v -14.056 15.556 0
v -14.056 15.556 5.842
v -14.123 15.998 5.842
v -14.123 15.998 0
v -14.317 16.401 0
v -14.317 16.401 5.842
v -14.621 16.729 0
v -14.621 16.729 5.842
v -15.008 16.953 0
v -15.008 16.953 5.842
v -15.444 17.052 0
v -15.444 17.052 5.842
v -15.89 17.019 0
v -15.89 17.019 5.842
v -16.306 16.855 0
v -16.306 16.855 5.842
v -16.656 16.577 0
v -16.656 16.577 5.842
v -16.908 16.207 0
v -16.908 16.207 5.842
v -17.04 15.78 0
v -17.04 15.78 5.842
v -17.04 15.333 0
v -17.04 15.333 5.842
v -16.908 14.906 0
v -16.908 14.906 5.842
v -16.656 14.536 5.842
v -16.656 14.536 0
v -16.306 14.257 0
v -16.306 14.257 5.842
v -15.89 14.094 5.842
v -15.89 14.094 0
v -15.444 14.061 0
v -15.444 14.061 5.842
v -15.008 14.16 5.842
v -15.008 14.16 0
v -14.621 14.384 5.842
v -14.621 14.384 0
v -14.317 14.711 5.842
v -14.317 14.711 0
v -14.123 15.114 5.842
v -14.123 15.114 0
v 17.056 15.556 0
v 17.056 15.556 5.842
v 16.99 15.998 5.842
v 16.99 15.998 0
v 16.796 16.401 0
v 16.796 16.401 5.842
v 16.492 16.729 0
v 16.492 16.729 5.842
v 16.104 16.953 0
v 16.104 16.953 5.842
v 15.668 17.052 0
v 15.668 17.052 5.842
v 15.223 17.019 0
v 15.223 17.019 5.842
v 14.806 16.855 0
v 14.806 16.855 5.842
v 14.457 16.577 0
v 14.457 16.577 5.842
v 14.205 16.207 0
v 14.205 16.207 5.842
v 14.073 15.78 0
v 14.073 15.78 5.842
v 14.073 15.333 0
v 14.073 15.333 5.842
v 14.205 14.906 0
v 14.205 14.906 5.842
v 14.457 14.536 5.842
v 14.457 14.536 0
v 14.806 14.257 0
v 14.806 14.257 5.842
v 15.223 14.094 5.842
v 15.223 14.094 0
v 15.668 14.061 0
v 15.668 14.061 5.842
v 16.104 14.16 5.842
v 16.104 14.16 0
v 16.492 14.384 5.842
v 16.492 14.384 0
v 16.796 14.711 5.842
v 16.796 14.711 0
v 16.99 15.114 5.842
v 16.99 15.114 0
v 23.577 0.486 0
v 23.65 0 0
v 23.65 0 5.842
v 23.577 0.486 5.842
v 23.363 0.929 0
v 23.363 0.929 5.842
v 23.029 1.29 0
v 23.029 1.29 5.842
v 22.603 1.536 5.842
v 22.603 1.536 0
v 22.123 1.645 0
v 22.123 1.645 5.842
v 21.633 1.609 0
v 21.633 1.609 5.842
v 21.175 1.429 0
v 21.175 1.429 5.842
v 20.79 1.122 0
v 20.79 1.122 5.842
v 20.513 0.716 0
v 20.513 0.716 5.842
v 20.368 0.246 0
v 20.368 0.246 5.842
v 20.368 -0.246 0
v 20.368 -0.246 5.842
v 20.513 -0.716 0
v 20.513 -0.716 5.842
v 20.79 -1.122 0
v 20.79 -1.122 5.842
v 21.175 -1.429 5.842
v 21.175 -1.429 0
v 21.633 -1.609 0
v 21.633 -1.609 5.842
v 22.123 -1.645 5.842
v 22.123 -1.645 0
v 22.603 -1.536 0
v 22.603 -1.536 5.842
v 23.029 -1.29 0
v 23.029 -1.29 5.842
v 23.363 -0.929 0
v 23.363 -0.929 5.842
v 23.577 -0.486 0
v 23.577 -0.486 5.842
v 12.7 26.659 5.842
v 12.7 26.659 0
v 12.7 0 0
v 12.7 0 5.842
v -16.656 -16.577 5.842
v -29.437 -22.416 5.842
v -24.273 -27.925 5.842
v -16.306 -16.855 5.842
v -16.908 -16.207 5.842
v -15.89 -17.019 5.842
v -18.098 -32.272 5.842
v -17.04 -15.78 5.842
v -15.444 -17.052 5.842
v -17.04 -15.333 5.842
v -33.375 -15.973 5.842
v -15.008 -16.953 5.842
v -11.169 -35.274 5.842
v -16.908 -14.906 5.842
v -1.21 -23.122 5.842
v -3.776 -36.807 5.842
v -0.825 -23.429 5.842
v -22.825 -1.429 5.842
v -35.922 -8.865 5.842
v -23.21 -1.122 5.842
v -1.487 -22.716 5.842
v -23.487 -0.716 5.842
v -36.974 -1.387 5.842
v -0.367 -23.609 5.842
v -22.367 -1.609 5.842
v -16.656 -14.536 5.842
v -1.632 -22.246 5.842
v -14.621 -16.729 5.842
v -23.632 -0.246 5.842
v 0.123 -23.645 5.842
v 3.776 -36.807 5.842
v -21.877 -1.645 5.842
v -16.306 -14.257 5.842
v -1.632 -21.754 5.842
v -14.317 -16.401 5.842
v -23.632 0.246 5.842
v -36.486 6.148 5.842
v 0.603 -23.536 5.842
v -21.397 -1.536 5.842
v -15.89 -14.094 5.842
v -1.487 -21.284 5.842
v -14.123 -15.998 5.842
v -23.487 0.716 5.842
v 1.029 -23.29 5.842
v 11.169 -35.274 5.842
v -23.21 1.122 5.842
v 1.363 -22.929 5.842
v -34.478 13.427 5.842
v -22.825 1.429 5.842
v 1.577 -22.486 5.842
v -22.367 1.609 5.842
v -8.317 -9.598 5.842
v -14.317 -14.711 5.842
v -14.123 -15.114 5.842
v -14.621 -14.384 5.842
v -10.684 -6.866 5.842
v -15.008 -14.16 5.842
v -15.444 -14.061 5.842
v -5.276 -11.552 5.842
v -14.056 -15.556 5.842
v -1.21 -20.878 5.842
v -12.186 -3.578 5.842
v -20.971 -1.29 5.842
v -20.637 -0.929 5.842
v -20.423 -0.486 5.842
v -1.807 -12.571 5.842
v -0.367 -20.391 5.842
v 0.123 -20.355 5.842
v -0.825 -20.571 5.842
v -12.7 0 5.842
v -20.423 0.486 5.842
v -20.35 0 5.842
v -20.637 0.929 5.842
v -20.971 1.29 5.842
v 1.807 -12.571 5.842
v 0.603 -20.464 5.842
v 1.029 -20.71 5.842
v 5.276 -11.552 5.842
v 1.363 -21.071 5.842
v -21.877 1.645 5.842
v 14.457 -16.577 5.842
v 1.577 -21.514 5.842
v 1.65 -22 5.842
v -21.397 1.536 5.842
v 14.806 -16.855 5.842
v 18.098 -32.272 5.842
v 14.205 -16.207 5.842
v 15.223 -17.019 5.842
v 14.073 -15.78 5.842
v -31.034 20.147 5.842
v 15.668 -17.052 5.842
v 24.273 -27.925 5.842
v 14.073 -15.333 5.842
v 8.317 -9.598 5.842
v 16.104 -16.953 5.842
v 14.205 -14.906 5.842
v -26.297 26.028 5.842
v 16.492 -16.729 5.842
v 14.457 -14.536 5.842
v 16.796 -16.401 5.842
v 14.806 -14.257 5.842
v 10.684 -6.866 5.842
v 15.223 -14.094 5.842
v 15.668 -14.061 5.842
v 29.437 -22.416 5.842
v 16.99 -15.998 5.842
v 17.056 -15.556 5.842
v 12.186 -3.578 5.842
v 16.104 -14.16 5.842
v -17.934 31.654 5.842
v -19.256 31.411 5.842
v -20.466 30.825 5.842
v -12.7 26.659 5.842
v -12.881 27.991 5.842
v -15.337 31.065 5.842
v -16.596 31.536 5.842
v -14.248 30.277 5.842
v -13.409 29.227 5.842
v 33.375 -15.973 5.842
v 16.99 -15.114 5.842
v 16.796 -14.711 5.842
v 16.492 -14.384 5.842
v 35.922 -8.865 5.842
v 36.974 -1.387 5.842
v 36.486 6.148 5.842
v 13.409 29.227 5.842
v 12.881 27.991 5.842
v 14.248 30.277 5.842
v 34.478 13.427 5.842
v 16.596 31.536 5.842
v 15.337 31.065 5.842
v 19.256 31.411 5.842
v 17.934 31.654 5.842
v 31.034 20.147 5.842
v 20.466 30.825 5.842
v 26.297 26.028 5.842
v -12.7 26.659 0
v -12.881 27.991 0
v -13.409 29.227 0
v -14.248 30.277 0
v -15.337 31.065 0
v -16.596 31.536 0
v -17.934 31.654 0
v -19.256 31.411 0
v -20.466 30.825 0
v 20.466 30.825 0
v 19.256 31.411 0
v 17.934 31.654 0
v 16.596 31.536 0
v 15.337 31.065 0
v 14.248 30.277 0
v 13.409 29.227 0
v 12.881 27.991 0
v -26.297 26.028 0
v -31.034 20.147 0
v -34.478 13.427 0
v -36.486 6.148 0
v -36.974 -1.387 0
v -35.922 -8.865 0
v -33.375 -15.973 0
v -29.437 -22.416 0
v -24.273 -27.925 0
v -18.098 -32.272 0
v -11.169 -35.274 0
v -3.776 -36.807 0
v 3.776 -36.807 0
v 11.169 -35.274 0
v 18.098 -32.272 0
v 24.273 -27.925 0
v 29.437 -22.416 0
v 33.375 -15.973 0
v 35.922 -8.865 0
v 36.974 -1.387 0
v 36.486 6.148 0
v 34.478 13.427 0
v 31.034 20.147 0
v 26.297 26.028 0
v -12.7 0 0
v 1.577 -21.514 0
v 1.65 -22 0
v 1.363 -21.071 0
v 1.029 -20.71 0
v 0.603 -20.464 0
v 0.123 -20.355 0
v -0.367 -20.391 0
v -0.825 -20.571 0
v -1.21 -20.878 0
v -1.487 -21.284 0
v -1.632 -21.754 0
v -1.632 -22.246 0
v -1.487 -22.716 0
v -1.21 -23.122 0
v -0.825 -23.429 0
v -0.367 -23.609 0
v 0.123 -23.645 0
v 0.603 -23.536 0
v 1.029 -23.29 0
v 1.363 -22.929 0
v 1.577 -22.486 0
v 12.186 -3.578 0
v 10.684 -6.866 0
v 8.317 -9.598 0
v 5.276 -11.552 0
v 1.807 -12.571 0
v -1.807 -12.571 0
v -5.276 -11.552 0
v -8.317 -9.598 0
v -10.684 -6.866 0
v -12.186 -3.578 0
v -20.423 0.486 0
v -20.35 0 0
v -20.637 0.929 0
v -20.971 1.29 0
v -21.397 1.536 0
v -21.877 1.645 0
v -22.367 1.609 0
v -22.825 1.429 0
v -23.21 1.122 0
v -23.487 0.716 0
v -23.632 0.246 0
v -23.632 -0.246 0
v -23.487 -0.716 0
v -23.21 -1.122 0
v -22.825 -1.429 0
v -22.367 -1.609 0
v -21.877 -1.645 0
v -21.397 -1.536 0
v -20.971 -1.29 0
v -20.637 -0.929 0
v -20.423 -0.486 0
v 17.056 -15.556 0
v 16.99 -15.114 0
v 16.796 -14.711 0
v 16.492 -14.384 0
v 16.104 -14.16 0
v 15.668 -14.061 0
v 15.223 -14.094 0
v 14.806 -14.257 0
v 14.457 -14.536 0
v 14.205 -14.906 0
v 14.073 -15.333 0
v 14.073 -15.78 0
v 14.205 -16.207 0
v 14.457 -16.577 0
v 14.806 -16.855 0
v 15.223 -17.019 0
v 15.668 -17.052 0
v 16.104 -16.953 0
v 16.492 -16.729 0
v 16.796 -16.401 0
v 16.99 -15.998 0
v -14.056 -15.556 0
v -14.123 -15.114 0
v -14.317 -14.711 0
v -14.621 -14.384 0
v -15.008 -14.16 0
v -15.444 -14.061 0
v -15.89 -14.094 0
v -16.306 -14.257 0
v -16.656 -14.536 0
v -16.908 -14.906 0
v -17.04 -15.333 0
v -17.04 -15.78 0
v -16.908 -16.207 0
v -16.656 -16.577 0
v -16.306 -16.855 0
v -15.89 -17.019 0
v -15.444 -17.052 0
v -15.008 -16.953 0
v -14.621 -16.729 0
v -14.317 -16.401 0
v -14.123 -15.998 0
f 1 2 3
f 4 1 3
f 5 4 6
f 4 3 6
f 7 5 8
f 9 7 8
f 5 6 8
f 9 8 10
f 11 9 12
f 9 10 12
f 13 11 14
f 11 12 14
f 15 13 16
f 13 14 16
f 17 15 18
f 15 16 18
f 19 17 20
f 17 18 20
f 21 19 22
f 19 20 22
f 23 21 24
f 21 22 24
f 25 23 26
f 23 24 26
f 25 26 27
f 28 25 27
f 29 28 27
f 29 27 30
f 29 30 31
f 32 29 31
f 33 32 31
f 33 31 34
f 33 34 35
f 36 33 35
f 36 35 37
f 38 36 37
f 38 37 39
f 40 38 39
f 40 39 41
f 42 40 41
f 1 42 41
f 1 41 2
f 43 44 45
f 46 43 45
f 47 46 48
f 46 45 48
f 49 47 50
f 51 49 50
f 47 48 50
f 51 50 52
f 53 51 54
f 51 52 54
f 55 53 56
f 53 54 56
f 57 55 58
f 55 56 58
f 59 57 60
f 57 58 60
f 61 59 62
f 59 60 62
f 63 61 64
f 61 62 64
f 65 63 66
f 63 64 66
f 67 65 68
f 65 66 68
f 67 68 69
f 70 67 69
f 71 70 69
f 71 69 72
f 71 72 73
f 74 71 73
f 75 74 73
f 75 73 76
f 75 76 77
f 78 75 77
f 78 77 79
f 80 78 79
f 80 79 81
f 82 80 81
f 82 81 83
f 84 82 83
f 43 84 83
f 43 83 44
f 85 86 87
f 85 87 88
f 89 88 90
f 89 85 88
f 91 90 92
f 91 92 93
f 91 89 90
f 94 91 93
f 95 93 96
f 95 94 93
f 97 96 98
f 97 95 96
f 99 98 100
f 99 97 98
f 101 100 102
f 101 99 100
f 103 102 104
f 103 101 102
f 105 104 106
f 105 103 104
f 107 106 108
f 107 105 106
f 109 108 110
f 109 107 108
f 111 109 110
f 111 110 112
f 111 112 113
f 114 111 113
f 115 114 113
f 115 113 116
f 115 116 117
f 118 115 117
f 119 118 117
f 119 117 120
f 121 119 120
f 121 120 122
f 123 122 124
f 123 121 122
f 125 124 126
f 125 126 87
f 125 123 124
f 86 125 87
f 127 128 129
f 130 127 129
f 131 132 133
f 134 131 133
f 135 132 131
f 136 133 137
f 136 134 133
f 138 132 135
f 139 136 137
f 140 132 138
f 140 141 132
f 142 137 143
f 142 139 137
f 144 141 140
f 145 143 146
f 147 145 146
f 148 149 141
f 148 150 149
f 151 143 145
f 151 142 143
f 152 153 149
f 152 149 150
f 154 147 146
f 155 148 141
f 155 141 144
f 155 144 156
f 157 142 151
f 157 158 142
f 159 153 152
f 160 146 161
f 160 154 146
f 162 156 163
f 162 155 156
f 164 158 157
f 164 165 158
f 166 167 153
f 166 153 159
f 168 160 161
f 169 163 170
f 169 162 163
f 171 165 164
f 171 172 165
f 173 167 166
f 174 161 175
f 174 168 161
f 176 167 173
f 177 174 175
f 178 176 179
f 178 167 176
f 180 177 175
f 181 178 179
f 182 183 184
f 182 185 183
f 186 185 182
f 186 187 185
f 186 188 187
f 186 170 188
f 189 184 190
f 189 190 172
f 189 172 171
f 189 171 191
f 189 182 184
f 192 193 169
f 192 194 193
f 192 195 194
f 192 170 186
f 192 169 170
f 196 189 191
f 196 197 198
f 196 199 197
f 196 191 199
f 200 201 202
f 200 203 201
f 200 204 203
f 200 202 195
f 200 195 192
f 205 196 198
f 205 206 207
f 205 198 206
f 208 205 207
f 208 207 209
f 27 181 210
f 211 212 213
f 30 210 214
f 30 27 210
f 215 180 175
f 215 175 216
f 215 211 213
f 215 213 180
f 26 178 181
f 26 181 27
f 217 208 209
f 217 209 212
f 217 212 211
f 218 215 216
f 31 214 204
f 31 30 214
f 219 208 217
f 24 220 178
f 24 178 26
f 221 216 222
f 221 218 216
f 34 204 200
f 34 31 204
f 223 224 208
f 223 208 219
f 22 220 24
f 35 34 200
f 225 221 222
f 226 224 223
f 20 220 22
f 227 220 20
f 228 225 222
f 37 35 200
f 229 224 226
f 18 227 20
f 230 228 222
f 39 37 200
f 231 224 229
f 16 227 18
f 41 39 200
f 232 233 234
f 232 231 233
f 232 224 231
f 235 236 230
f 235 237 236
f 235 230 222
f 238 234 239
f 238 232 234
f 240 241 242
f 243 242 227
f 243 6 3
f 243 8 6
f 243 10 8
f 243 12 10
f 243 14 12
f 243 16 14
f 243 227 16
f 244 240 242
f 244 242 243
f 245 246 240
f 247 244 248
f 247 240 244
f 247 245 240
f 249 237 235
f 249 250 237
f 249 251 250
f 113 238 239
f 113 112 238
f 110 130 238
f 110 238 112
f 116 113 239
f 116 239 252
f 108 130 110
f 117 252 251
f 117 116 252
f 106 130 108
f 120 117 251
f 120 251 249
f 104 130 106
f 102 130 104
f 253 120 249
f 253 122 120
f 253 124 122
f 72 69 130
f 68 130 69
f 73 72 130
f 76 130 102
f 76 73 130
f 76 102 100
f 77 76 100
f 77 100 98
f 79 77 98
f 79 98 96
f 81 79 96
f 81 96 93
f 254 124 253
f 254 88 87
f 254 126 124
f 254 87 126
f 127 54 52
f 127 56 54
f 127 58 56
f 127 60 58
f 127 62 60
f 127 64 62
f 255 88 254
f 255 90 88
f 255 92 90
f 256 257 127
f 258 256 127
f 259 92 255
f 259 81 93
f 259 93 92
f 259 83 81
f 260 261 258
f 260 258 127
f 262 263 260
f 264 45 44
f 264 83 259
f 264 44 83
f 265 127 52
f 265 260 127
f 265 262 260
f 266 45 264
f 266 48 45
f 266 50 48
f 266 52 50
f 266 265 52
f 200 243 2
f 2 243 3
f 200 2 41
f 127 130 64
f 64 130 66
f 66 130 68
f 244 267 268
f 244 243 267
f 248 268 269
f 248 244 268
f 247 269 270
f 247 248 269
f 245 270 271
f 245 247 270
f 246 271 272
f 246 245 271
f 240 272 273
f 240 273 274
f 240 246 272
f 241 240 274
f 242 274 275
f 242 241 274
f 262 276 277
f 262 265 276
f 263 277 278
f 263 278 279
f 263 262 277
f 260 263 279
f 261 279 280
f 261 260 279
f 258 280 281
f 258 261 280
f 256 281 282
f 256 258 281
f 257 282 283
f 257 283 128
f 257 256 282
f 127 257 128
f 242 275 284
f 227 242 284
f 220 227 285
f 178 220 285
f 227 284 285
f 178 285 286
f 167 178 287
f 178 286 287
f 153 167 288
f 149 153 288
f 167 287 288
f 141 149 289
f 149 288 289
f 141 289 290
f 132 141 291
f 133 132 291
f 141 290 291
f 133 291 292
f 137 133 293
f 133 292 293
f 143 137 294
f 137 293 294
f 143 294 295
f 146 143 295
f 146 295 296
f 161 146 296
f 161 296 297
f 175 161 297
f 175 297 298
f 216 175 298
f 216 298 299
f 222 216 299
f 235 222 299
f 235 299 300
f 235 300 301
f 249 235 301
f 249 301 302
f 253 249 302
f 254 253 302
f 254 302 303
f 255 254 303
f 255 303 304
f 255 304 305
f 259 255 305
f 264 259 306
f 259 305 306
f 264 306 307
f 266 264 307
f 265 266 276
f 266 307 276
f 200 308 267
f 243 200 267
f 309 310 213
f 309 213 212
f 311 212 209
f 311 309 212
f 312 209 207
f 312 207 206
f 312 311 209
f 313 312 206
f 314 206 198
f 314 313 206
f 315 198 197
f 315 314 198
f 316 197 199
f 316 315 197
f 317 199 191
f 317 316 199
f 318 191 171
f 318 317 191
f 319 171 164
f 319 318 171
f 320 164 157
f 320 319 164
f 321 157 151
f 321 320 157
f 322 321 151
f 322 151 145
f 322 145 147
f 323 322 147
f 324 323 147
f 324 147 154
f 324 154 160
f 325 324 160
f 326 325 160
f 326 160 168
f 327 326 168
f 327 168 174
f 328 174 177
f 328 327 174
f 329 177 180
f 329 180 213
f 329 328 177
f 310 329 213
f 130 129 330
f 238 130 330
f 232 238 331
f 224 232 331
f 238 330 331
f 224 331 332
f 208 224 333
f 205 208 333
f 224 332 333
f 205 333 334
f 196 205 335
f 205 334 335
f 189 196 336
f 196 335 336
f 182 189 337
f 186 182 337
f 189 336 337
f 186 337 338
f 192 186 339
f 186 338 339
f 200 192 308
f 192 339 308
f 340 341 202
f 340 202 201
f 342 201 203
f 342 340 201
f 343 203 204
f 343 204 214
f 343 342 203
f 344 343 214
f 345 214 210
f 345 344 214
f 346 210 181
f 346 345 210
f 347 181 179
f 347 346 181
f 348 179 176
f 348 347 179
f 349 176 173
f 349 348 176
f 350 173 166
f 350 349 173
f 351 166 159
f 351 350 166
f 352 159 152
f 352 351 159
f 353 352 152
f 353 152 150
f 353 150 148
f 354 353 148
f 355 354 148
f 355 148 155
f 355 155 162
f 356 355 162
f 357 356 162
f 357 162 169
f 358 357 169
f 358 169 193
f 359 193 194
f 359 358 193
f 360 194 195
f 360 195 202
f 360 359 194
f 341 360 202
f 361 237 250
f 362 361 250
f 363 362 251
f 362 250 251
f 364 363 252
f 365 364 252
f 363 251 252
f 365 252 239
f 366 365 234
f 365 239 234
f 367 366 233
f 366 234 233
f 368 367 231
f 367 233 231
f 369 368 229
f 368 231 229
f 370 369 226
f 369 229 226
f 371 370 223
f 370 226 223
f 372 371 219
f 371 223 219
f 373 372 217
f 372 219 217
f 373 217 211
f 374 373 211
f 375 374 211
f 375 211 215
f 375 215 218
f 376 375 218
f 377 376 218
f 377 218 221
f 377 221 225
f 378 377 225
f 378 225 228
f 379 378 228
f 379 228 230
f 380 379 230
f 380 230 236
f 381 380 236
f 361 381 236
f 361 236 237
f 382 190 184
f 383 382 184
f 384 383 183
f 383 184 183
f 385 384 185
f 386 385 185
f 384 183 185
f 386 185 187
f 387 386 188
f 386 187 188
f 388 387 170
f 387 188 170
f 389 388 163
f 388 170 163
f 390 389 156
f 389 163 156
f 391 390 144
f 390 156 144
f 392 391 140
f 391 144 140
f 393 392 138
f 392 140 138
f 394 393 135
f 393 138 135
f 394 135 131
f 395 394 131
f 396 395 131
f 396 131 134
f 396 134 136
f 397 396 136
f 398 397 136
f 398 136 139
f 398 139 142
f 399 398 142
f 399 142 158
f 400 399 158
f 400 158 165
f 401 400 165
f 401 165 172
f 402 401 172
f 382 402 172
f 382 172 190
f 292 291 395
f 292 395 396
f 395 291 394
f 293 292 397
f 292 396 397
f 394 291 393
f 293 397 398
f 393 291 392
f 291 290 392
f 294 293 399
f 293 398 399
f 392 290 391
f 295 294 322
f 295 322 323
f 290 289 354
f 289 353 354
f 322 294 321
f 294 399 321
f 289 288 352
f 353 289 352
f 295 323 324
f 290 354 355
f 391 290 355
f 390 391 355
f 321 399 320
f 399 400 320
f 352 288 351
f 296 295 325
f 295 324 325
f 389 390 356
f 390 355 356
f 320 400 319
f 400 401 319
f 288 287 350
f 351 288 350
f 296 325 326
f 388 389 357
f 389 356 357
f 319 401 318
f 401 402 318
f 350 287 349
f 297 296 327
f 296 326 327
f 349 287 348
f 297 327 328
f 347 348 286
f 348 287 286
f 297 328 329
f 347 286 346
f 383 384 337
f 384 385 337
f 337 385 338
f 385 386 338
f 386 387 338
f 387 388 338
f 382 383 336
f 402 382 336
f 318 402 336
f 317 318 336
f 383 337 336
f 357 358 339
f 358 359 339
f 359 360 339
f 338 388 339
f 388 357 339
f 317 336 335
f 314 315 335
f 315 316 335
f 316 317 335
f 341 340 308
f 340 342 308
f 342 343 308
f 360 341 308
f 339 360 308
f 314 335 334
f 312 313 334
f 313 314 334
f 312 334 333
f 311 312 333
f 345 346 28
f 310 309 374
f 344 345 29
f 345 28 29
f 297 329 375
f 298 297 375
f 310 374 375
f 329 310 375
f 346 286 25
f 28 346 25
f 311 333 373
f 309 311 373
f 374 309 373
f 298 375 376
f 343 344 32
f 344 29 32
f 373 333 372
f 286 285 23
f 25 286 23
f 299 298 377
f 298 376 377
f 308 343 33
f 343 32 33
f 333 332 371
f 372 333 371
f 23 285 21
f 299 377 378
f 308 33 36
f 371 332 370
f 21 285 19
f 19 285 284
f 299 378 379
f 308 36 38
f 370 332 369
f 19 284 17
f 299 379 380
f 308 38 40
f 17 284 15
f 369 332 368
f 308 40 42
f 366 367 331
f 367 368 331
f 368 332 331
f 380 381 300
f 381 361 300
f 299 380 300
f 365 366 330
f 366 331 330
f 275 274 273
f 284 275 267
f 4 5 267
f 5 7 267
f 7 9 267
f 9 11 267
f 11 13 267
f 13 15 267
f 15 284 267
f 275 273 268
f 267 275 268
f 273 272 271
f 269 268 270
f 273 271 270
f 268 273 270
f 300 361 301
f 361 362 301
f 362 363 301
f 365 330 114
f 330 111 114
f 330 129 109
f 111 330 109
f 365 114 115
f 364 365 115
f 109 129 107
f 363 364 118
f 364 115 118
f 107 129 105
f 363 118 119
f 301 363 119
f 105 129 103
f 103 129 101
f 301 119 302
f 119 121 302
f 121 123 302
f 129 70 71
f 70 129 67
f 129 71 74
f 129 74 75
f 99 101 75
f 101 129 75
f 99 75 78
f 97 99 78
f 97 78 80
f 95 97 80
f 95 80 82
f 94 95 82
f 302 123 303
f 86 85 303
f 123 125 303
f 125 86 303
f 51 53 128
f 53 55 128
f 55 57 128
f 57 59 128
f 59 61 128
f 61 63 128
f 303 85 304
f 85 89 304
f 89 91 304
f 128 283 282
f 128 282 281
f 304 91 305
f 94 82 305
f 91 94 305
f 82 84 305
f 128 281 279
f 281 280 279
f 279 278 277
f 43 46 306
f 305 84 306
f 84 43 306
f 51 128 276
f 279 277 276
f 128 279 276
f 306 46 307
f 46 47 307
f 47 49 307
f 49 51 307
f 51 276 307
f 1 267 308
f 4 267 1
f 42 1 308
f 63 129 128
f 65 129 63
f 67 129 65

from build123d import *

# Parameters (mm, degrees)
SKETCH1_R           = 1.65
BOSS_EXTRUDE1_DEPTH = 5.842
FILLET1_R           = 5
SKETCH2_R           = 1.5
CUT_EXTRUDE1_DEPTH  = 53.651011044


with BuildPart() as part:
    # Sketch1 → Boss-Extrude1 (new body)
    with BuildSketch(Plane.XY):
        with BuildLine():
            Line((-12.7, 0), (-12.7, 34.752122237))
            ThreePointArc((-12.7, 34.752122237), (0, -37), (12.7, 34.752122237))
            Line((12.7, 34.752122237), (12.7, 0))
            ThreePointArc((12.7, 0), (0, -12.7), (-12.7, 0))
        make_face()
        with Locations((22, 0)):
            Circle(SKETCH1_R, mode=Mode.SUBTRACT)
        with Locations((0, -22)):
            Circle(SKETCH1_R, mode=Mode.SUBTRACT)
        with Locations((-22, 0)):
            Circle(SKETCH1_R, mode=Mode.SUBTRACT)
    extrude(amount=BOSS_EXTRUDE1_DEPTH)

    # Fillet1
    fillet1_edges = [part.edges().sort_by_distance(p)[0] for p in [
        (12.7, 34.752122237, 2.921),
        (-12.7, 34.752122237, 2.921),
    ]]
    fillet(fillet1_edges, radius=FILLET1_R)

    # Sketch2 → Cut-Extrude1 (cut, through all)
    with BuildSketch(Plane.XY.offset(5.842)):
        with Locations((-15.556349186, -15.556349186)):
            Circle(SKETCH2_R)
        with Locations((-15.556349186, 15.556349186)):
            Circle(SKETCH2_R)
        with Locations((15.556349186, 15.556349186)):
            Circle(SKETCH2_R)
        with Locations((15.556349186, -15.556349186)):
            Circle(SKETCH2_R)
    extrude(amount=-CUT_EXTRUDE1_DEPTH, mode=Mode.SUBTRACT)


solid = part.part
